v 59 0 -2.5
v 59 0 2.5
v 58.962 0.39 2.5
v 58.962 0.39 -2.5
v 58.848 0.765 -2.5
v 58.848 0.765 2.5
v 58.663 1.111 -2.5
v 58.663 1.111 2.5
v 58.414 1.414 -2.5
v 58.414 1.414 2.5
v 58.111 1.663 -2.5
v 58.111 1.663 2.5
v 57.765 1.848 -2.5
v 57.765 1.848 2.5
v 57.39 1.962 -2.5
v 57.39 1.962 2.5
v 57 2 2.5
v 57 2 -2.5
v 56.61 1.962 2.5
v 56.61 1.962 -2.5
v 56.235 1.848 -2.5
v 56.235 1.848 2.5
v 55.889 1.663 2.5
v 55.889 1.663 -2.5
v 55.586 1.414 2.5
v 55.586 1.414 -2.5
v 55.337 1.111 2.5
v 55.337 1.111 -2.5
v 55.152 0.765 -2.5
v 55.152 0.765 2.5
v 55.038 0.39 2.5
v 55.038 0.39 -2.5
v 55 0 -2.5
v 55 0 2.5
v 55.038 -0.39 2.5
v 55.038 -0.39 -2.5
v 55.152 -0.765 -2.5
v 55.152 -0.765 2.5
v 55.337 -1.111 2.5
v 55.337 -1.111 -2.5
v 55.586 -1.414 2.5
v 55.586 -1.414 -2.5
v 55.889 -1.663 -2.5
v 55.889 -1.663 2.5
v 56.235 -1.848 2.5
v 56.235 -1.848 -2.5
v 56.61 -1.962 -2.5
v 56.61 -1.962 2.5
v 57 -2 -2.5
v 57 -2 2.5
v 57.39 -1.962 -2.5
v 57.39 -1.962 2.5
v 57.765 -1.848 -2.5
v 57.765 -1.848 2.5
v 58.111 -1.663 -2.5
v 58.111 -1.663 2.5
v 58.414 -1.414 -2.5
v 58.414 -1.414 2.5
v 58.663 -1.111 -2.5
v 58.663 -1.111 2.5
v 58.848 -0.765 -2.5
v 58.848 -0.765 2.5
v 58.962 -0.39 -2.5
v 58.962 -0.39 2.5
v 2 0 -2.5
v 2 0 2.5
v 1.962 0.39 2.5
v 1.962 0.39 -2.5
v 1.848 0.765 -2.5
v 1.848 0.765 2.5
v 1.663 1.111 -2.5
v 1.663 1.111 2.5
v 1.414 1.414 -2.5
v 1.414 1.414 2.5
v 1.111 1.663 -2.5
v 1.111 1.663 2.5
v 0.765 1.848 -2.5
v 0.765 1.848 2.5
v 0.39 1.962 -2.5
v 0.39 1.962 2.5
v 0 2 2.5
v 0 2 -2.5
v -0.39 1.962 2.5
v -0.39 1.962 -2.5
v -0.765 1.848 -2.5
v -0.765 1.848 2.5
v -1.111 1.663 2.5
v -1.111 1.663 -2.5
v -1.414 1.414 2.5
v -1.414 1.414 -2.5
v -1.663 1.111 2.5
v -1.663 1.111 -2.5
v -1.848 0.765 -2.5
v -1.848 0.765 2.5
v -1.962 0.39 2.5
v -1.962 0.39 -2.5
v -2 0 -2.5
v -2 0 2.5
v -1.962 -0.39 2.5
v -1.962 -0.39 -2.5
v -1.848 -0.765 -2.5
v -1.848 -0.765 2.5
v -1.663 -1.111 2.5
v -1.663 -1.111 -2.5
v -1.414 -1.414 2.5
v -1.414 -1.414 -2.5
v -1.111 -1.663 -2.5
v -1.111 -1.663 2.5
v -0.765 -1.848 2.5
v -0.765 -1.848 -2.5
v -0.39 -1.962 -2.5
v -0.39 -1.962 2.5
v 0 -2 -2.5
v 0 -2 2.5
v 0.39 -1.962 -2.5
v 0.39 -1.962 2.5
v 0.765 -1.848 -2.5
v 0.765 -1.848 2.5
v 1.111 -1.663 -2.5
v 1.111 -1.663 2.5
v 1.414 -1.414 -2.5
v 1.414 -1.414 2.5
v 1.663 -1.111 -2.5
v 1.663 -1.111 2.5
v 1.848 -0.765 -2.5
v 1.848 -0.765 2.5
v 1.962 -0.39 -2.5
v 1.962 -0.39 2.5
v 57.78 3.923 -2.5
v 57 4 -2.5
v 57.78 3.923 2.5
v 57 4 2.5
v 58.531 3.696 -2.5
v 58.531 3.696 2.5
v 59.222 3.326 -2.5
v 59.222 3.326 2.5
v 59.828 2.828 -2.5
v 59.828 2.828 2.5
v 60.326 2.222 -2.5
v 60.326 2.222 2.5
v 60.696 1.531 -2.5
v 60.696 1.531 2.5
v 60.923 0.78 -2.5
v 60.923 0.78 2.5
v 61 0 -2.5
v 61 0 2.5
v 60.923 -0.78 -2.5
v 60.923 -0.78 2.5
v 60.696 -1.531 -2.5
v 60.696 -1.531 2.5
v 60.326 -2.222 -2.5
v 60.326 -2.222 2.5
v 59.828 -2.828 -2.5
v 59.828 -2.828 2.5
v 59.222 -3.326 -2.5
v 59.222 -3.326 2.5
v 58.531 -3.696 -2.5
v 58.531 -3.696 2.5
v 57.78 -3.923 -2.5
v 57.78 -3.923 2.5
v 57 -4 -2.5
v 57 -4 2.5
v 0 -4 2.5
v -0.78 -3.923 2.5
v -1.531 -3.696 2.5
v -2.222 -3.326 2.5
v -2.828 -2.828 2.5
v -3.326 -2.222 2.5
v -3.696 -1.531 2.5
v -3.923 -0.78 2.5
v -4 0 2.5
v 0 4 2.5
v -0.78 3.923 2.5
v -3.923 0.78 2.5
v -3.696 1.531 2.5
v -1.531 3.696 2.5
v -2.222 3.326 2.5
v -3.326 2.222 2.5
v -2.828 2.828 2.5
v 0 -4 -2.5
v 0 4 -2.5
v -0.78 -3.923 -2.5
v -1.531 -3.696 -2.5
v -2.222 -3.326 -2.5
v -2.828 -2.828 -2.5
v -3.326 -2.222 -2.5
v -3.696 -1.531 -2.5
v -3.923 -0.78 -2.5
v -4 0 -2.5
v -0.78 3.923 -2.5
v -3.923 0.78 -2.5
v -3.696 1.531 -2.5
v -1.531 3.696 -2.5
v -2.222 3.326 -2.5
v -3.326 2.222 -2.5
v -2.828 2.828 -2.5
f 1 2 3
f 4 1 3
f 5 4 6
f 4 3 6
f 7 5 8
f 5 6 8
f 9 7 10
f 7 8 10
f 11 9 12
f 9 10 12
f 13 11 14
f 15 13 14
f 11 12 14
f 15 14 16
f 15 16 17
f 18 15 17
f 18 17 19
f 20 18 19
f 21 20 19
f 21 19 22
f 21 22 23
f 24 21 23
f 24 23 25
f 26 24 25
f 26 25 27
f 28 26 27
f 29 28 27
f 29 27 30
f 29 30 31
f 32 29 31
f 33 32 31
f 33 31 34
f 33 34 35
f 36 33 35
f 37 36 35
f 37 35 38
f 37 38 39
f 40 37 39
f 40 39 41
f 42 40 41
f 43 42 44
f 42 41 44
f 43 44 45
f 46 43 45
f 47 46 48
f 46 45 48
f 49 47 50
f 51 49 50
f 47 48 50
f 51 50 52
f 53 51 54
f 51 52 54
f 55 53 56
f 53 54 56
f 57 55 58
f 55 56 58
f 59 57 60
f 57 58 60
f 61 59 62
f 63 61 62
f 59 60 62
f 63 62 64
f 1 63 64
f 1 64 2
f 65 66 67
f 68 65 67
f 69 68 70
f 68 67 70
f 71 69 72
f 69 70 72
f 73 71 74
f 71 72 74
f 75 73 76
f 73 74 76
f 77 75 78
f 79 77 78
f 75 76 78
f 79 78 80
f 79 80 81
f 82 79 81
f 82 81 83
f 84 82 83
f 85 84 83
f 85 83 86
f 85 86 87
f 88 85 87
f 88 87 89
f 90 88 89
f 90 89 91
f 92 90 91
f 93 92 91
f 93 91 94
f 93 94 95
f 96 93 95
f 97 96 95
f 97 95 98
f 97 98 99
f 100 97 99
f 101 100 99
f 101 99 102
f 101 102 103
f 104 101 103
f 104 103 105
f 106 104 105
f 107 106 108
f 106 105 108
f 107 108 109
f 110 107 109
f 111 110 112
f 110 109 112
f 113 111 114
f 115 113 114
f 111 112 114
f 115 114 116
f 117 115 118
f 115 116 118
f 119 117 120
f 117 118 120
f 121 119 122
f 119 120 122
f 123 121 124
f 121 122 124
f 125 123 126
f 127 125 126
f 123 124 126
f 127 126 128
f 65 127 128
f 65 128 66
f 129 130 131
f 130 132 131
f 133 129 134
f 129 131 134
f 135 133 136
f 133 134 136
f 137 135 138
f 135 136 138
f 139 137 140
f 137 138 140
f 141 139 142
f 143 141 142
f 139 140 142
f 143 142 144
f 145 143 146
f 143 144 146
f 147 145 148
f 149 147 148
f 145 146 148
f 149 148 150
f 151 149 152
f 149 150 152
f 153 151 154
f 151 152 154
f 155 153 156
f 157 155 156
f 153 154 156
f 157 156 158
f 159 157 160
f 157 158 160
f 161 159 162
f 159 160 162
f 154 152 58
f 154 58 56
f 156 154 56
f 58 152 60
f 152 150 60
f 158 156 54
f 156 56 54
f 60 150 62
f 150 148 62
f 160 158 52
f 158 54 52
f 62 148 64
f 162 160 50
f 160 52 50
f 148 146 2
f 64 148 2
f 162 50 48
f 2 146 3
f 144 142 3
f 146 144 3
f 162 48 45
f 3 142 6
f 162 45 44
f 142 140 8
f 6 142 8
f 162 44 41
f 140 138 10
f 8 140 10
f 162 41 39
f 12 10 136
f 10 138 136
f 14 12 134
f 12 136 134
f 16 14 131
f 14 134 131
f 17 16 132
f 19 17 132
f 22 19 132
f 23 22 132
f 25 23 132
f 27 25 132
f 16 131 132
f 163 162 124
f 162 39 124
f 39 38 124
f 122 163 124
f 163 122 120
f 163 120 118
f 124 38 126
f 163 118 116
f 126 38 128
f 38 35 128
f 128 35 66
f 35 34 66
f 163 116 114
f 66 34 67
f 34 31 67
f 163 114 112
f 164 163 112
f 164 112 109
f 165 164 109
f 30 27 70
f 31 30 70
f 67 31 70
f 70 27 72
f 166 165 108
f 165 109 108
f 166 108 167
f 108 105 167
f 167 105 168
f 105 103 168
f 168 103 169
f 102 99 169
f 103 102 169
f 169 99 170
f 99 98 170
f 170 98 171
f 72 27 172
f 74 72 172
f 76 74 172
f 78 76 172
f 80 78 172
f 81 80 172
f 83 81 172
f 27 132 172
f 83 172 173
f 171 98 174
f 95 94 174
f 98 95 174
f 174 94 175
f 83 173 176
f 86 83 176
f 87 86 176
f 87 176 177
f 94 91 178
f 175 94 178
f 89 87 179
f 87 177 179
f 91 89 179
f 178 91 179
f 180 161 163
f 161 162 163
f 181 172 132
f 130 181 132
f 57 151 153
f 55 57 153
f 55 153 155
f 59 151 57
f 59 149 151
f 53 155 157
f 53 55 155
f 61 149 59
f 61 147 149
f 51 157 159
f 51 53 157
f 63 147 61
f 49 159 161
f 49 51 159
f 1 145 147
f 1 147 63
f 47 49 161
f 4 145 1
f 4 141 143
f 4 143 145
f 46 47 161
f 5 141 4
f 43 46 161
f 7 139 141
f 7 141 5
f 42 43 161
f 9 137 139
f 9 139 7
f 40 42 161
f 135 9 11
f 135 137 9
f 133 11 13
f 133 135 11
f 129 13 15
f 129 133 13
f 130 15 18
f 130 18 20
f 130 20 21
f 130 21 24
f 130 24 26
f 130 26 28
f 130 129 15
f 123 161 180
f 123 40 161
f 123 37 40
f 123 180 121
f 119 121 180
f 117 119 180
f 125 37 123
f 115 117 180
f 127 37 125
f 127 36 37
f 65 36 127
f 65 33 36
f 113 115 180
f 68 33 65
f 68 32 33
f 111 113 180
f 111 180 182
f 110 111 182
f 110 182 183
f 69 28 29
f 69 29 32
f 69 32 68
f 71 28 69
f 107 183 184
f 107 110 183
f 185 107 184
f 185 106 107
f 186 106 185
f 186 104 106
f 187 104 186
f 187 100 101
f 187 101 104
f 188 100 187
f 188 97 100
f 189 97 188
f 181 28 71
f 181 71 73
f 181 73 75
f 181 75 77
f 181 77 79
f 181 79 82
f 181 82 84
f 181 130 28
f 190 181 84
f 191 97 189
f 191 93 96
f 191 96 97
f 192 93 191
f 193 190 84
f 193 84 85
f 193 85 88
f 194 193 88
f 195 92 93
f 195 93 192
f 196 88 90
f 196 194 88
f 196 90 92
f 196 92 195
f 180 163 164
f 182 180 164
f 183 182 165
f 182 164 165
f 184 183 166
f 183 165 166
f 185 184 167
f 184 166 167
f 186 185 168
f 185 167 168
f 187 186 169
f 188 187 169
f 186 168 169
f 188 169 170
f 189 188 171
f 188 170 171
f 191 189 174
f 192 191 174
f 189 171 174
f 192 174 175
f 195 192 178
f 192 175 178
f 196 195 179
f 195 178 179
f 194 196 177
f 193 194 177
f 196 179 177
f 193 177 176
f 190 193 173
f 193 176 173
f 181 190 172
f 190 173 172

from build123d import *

# Parameters (mm, degrees)
BOSS_EXTRUDE1_DEPTH = 2.5
SKETCH2_R           = 2
CUT_EXTRUDE1_DEPTH  = 62.335144901


with BuildPart() as part:
    # Sketch1 → Boss-Extrude1 (new, symmetric)
    with BuildSketch(Plane.XY):
        with BuildLine():
            Line((0, 4), (57, 4))
            ThreePointArc((57, 4), (61, 0), (57, -4))
            Line((57, -4), (0, -4))
            ThreePointArc((0, -4), (-4, 0), (0, 4))
        make_face()
    extrude(amount=BOSS_EXTRUDE1_DEPTH, both=True)

    # Sketch2 → Cut-Extrude1 (cut, through all)
    with BuildSketch(Plane.XY.offset(2.5)):
        with Locations((57, 0)):
            Circle(SKETCH2_R)
        Circle(SKETCH2_R)
    extrude(amount=-CUT_EXTRUDE1_DEPTH, mode=Mode.SUBTRACT)


solid = part.part
